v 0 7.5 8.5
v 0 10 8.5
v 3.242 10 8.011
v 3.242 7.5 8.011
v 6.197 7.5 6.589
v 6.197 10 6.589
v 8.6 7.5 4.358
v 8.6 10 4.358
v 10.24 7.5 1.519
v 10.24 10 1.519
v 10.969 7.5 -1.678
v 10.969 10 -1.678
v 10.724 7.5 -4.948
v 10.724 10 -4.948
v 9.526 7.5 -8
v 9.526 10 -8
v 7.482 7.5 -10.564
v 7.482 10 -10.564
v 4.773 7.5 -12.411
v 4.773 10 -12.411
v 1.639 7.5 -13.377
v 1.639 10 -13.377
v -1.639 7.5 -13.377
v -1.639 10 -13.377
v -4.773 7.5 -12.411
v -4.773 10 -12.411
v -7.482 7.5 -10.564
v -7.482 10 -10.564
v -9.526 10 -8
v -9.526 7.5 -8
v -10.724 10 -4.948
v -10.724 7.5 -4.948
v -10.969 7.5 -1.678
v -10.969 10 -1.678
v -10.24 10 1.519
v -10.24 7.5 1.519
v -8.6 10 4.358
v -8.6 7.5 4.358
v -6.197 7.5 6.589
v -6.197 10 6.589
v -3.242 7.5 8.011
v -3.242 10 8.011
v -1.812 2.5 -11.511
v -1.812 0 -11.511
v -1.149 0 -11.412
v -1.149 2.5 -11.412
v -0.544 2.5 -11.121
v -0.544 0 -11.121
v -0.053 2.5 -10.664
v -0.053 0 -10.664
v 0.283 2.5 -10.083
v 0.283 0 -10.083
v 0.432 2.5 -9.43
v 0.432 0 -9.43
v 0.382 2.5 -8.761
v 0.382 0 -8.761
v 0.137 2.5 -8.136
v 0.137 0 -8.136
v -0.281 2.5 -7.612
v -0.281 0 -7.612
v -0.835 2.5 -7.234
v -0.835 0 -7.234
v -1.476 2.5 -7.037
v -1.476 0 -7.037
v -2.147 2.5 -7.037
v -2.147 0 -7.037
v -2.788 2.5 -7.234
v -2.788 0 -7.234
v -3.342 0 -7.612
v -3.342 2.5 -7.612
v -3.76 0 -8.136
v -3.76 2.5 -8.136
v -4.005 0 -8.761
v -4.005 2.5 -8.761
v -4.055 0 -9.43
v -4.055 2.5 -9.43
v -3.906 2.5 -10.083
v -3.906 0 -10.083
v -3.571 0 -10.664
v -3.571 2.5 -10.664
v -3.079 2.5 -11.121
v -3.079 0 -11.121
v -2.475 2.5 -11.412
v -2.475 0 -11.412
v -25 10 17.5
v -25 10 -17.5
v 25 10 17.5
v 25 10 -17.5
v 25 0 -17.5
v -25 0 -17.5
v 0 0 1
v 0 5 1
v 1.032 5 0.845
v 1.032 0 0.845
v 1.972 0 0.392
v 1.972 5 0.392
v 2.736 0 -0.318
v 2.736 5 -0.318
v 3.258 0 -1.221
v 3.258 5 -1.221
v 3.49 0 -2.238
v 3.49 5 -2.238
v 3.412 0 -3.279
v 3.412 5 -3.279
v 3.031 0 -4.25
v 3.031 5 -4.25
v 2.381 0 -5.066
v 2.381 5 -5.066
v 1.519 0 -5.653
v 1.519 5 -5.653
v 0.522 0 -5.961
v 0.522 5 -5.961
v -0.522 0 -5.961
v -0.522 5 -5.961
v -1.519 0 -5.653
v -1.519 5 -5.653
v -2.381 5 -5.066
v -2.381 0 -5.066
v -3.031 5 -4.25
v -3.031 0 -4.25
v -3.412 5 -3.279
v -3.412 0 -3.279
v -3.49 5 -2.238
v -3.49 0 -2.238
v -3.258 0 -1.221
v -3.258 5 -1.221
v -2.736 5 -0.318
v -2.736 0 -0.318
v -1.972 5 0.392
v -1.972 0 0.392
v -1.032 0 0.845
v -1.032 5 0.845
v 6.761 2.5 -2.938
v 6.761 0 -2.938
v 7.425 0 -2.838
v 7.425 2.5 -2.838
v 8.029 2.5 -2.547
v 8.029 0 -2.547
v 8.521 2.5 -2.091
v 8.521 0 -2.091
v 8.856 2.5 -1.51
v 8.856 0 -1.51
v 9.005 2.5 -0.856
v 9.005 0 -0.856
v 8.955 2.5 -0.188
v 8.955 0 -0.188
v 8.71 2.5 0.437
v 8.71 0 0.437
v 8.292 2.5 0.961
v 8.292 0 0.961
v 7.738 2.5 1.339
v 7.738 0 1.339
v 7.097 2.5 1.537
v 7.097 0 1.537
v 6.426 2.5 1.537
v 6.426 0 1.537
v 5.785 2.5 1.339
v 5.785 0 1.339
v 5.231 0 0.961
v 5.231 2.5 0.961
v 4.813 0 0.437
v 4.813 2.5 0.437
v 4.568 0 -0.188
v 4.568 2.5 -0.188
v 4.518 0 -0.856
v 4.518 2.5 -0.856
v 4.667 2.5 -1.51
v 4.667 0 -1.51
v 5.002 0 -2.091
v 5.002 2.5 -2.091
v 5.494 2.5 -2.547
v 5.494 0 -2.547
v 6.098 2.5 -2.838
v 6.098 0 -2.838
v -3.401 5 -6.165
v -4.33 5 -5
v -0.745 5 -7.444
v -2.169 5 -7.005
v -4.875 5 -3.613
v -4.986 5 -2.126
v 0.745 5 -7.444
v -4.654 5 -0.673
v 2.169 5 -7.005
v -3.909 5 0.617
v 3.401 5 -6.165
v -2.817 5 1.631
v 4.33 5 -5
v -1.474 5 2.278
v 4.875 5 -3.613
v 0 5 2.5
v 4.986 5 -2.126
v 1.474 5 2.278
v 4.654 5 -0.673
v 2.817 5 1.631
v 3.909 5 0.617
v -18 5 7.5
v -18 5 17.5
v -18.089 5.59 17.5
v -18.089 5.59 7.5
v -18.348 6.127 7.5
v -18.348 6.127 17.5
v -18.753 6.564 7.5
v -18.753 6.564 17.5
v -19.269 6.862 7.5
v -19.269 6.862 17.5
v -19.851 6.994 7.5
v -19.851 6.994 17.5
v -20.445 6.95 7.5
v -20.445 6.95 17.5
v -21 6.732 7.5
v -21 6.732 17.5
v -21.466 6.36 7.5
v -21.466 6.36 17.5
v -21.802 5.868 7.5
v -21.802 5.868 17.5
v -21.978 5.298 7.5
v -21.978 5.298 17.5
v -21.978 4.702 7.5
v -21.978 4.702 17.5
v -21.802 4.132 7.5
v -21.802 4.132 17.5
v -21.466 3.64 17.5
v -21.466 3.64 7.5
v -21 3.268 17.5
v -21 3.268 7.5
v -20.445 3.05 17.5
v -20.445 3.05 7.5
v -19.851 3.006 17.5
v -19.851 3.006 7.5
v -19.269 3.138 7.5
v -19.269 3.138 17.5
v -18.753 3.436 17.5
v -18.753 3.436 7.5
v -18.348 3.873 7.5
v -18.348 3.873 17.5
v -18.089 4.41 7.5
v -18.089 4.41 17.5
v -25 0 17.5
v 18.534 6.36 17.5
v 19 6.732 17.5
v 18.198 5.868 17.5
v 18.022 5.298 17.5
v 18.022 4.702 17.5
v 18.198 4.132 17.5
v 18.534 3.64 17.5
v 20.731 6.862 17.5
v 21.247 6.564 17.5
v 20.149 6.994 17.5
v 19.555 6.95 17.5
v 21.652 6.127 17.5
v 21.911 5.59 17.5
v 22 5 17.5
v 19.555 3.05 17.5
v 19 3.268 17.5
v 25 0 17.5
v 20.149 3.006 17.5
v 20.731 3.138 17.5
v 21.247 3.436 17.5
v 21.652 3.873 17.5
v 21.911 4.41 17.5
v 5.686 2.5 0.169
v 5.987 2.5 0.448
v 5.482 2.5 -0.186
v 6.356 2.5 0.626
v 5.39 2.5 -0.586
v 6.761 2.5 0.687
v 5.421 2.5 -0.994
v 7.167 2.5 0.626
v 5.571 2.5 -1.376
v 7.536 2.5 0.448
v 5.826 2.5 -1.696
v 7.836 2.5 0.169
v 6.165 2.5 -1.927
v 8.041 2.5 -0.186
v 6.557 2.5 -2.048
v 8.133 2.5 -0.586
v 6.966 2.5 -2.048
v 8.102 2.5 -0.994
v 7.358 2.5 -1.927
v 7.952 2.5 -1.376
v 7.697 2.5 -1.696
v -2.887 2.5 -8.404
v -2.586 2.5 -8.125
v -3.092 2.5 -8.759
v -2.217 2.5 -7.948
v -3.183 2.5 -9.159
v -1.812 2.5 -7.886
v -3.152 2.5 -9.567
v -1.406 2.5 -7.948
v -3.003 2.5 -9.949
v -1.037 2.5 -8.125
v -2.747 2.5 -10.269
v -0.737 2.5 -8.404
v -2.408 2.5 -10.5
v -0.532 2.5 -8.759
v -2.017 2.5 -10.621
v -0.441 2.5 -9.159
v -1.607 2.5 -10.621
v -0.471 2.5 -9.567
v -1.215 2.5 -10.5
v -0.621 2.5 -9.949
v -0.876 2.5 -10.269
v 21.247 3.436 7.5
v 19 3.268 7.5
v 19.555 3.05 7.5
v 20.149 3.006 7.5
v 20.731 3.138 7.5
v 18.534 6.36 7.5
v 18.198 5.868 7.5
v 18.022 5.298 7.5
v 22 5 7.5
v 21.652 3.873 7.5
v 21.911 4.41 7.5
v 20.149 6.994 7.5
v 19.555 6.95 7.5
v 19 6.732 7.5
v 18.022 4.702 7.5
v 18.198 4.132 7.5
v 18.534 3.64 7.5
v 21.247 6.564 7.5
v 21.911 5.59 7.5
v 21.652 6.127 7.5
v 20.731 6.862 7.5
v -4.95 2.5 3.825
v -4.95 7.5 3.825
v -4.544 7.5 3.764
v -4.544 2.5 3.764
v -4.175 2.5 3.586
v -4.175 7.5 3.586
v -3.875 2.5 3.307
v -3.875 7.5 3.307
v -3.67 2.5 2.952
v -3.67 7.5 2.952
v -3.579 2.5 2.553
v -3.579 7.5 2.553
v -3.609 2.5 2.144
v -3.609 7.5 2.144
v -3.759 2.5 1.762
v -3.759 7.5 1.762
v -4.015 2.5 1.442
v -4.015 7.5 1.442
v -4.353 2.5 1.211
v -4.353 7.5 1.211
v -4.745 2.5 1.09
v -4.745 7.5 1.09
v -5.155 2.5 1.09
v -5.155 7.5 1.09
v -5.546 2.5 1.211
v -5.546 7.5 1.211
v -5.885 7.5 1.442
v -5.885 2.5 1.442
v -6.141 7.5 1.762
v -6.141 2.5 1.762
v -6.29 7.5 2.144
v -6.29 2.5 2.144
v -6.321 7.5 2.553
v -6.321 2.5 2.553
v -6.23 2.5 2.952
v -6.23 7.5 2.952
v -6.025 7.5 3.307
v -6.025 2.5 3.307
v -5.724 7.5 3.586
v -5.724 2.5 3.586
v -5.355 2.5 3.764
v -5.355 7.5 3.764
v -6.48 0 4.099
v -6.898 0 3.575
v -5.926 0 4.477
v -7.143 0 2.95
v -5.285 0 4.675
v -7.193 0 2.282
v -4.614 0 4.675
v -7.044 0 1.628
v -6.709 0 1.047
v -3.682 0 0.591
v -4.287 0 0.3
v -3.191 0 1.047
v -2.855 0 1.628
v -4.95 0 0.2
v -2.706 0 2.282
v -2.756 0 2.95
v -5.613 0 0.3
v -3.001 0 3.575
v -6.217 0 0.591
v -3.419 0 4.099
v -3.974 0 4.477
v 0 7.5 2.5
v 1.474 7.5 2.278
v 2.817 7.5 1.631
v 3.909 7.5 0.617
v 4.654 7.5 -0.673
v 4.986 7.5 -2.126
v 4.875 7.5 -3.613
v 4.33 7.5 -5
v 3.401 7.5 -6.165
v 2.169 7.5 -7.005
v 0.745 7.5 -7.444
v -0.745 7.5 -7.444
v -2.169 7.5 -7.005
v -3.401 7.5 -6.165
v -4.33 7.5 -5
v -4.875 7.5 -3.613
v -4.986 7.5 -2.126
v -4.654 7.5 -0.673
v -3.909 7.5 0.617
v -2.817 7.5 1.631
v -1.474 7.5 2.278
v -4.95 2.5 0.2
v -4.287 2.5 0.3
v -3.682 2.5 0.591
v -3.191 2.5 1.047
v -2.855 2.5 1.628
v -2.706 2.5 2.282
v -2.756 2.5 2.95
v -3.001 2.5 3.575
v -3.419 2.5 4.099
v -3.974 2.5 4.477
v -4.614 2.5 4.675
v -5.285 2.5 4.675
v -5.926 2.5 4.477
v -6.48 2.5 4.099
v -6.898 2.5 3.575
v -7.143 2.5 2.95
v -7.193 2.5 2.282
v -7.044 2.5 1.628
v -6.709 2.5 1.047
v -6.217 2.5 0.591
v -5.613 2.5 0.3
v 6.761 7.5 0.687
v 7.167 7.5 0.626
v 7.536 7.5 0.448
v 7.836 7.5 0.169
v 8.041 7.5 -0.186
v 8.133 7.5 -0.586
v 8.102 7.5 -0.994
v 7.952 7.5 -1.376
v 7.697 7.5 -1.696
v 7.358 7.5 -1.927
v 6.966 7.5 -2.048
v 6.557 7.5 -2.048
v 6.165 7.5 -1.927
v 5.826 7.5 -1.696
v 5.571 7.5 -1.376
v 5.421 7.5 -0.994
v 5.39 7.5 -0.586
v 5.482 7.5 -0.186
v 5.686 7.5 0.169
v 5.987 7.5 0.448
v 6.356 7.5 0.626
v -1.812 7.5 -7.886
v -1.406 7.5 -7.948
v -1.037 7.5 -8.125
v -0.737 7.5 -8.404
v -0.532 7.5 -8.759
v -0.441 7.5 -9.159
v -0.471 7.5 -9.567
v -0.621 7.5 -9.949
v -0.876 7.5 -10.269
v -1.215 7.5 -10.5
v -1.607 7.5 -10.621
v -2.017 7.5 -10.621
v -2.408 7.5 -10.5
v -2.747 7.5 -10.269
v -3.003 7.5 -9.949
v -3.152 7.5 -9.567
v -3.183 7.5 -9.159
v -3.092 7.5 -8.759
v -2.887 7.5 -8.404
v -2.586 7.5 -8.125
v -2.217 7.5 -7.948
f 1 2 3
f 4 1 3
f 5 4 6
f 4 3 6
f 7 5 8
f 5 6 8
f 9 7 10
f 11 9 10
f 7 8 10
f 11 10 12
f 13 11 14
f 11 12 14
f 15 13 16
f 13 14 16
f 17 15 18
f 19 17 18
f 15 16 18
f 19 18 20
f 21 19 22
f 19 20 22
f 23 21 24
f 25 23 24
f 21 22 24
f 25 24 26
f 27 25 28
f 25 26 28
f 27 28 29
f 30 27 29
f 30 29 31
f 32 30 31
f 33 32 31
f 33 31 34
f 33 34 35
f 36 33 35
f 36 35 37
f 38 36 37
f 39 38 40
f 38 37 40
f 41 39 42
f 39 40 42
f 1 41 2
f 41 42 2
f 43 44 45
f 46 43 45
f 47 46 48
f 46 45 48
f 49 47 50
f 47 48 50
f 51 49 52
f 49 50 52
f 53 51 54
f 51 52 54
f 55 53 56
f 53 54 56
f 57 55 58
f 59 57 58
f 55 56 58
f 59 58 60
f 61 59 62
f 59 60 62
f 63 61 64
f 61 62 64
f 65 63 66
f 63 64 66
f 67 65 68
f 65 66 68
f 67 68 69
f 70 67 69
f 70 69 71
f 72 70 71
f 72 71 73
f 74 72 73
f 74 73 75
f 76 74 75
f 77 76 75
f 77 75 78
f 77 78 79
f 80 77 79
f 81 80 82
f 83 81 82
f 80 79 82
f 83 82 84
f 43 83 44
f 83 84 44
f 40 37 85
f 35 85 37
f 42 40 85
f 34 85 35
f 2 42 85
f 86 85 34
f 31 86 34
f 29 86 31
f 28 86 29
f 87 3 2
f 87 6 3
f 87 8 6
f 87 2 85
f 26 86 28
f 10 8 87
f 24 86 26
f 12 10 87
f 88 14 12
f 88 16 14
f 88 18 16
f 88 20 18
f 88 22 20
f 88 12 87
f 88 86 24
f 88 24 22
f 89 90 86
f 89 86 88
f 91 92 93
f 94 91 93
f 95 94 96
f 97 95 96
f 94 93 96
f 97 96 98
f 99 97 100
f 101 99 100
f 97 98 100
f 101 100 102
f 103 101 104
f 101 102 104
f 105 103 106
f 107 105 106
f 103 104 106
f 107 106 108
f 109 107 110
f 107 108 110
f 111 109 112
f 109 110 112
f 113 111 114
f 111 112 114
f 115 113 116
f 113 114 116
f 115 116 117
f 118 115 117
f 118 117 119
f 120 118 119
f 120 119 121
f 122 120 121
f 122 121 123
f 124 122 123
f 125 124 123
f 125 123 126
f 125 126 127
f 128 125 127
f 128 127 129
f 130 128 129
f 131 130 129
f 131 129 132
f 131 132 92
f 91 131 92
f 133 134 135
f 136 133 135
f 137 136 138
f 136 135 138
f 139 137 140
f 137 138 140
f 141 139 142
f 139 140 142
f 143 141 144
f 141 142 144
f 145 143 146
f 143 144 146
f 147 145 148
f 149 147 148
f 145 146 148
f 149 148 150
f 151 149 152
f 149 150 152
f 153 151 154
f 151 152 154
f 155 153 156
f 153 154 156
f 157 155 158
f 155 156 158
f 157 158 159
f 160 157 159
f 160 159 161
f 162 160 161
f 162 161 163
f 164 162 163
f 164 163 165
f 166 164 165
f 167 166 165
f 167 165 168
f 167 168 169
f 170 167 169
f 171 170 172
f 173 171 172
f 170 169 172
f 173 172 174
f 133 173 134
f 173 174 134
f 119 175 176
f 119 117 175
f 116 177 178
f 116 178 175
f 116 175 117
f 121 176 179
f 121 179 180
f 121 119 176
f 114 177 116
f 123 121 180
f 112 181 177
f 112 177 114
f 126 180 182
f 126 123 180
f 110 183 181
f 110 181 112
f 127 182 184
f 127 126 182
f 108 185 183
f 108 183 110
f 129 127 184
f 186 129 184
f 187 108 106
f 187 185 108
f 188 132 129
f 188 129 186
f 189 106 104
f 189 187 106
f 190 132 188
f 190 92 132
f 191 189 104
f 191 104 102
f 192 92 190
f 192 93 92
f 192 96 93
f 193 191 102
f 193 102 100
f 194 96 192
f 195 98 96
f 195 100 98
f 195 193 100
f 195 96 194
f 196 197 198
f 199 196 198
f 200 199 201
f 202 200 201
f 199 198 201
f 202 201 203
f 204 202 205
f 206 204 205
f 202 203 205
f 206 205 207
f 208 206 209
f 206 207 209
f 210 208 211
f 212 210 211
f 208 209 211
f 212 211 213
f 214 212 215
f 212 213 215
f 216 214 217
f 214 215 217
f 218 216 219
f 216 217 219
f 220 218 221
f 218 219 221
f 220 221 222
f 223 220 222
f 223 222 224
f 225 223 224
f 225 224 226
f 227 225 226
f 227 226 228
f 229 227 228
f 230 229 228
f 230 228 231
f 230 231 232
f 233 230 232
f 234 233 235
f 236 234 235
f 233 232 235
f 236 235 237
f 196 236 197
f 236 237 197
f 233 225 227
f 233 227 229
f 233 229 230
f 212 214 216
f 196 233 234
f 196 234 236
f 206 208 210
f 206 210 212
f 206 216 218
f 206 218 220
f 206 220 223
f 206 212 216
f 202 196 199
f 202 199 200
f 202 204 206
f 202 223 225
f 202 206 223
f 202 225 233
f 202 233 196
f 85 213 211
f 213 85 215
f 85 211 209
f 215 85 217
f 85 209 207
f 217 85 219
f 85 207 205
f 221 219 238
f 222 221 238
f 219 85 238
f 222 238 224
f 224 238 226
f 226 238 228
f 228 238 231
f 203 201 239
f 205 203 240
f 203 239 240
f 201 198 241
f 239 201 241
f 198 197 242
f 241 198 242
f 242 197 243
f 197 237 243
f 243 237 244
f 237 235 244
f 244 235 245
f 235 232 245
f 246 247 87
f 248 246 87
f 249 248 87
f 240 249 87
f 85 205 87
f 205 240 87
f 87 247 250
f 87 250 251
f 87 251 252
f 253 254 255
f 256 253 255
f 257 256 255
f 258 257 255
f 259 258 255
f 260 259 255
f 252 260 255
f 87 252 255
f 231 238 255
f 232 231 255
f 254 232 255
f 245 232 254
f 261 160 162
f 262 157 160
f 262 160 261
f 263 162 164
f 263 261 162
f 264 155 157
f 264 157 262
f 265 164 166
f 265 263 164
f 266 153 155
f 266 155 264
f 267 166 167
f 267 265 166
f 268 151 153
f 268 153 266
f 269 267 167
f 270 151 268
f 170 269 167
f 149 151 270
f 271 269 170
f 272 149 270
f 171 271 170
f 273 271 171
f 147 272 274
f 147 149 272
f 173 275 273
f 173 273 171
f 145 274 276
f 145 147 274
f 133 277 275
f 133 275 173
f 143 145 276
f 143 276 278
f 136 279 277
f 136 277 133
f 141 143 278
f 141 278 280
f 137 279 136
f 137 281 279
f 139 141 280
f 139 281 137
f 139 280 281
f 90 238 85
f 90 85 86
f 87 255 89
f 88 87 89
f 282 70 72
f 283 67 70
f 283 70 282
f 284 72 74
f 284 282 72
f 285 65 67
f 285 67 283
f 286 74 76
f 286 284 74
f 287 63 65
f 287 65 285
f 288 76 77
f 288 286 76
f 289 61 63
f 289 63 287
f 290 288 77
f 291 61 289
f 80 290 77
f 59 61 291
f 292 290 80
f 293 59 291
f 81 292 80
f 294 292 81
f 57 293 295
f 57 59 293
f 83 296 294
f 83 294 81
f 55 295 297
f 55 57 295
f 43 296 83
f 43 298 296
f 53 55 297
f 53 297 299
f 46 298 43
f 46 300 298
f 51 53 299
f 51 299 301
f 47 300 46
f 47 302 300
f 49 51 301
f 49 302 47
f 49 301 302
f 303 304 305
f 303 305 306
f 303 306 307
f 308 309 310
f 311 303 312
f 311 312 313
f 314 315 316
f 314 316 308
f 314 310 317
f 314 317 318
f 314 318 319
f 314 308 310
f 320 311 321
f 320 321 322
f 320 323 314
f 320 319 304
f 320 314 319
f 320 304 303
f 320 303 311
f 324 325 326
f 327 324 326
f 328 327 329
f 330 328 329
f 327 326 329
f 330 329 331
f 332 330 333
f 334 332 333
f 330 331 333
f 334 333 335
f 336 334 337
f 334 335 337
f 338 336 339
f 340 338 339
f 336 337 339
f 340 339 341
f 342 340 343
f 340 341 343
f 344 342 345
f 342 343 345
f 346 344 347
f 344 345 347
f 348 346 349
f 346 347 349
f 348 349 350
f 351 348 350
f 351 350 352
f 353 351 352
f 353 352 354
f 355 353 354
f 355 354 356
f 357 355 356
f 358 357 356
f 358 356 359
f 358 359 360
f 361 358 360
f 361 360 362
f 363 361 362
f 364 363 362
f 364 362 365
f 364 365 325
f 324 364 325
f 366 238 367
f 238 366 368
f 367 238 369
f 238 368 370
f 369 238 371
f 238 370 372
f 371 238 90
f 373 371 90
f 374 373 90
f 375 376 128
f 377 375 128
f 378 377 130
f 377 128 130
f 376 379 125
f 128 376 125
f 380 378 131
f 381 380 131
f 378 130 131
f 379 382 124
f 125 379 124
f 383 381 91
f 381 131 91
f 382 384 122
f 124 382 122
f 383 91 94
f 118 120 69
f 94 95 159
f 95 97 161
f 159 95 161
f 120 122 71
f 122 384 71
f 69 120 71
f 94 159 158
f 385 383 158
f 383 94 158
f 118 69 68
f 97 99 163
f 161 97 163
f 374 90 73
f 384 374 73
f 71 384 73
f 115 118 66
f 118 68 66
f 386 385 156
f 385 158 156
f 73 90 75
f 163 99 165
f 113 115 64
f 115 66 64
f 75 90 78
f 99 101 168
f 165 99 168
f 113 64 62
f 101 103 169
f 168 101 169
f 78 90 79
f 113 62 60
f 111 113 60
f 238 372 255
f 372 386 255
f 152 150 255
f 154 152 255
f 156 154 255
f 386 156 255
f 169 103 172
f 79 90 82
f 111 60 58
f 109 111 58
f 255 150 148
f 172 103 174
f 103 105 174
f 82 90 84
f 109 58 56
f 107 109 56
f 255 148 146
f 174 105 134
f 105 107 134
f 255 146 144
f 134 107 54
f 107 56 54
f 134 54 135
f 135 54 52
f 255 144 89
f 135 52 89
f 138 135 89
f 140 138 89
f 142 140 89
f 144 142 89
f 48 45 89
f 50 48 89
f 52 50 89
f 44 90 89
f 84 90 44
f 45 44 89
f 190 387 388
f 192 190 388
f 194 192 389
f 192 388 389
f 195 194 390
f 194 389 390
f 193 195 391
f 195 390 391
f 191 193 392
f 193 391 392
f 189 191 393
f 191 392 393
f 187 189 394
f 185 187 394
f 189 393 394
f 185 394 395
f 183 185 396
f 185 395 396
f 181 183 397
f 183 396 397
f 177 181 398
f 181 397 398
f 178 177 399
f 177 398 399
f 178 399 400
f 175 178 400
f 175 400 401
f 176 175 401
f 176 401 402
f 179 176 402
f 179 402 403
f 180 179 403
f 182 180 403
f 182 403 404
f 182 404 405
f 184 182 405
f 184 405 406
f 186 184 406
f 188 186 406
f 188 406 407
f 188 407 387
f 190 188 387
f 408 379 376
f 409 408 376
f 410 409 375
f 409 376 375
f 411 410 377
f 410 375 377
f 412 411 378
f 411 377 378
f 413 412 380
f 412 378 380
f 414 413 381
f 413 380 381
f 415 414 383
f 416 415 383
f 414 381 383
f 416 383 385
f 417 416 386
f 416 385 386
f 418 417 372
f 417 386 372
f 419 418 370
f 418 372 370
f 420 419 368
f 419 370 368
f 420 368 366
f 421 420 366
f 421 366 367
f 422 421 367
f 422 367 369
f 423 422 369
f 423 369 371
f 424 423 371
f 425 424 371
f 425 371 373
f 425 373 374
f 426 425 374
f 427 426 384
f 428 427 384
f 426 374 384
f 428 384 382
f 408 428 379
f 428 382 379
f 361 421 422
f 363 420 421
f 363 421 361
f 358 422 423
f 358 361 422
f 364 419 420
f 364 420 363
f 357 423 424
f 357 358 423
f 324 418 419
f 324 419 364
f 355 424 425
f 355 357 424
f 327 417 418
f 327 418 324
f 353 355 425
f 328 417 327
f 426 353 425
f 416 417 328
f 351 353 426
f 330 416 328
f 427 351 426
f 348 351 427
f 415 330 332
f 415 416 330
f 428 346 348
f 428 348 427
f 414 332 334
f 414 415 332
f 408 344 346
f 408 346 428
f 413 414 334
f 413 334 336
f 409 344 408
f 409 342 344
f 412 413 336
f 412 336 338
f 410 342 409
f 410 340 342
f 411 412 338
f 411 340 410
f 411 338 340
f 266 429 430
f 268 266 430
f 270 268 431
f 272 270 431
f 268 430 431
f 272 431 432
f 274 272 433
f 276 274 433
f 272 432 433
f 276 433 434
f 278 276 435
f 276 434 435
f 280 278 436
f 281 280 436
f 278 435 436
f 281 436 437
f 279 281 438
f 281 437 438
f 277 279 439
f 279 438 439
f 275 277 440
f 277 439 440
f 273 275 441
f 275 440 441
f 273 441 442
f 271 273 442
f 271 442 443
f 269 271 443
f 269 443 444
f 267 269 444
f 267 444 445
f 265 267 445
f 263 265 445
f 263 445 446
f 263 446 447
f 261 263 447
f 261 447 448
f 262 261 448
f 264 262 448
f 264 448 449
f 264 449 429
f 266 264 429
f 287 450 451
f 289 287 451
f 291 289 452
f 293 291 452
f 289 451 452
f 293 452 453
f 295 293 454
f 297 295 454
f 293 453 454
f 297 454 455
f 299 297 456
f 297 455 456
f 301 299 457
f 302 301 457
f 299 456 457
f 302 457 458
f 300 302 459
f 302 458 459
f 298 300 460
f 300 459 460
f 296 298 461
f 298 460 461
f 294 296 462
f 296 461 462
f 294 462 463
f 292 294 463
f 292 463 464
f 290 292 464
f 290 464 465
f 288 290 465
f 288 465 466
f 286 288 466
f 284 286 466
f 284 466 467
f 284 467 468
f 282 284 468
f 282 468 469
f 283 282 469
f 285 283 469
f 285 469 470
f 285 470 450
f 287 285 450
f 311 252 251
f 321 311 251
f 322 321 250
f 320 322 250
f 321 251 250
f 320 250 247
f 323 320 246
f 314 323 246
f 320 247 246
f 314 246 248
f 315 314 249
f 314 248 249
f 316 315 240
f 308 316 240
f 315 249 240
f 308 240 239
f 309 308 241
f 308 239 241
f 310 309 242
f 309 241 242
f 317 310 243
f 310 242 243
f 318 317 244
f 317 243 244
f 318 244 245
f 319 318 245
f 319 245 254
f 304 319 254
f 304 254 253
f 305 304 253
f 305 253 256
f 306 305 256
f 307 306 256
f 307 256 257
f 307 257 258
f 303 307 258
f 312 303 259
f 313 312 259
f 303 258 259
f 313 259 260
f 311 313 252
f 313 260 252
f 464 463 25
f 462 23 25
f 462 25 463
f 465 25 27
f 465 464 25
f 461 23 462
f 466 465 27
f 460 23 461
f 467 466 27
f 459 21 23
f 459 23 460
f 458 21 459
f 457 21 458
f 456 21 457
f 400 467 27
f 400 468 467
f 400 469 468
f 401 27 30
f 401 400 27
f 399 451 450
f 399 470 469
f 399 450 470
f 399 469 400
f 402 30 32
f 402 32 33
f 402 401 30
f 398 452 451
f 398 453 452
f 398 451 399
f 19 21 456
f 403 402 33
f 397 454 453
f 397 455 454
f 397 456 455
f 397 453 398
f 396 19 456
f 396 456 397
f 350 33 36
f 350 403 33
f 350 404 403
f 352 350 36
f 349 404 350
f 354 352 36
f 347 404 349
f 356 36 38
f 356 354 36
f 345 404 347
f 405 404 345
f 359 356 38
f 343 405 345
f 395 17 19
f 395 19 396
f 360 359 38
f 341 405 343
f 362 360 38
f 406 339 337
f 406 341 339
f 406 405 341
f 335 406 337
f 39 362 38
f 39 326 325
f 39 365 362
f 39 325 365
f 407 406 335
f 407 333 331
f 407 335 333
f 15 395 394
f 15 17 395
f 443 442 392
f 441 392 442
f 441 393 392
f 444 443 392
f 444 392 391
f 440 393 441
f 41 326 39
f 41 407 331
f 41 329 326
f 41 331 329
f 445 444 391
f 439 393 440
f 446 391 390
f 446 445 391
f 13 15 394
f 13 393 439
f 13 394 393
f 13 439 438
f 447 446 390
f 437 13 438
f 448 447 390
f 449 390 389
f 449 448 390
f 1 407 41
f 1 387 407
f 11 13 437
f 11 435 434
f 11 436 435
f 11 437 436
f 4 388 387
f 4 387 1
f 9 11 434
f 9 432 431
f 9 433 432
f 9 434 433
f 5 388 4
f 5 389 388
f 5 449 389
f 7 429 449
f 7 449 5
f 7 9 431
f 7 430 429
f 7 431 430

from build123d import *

# Parameters (mm, degrees)
ESQUISSE1_W             = 50
ESQUISSE1_H             = 35
BOSS_EXTRU_1_DEPTH      = 10
ESQUISSE2_R             = 5
ENL_V_MAT_EXTRU_1_DEPTH = 5
ESQUISSE3_R             = 1.375
ESQUISSE3_R_2           = 3.5
ENL_V_MAT_EXTRU_2_DEPTH = 15
ESQUISSE4_R             = 11
ENL_V_MAT_EXTRU_3_DEPTH = 2.5
ESQUISSE5_R             = 2.25
ENL_V_MAT_EXTRU_4_DEPTH = 2.5
ESQUISSE6_R             = 2
ENL_V_MAT_EXTRU_5_DEPTH = 10


with BuildPart() as part:
    # Esquisse1 → Boss.-Extru.1 (new body)
    with BuildSketch(Plane(origin=(0, 0, 0), x_dir=(1, 0, 0), z_dir=(0, 1, 0))):
        Rectangle(ESQUISSE1_W, ESQUISSE1_H)
    extrude(amount=BOSS_EXTRU_1_DEPTH)

    # Esquisse2 → Enlèv. mat.-Extru.1 (cut)
    with BuildSketch(Plane(origin=(0, 10, 0), x_dir=(1, 0, 0), z_dir=(0, 1, 0))):
        with Locations(Location((0, 2.5, 0), (0, 0, 270))):
            Circle(ESQUISSE2_R)
    extrude(amount=-ENL_V_MAT_EXTRU_1_DEPTH, mode=Mode.SUBTRACT)

    # Esquisse3 → Enlèv. mat.-Extru.2 (cut)
    with BuildSketch(Plane(origin=(0, 10, 0), x_dir=(1, 0, 0), z_dir=(0, 1, 0))):
        with Locations(Location((-1.811733316, 9.261480784, 0), (0, 0, 270))):
            Circle(ESQUISSE3_R)
        with Locations(Location((6.761480784, 0.688266684, 0), (0, 0, 270))):
            Circle(ESQUISSE3_R)
        with Locations(Location((-4.949747468, -2.449747468, 0), (0, 0, 270))):
            Circle(ESQUISSE3_R)
        with Locations(Location((0, 2.5, 0), (0, 0, 270))):
            Circle(ESQUISSE3_R_2)
    extrude(amount=-ENL_V_MAT_EXTRU_2_DEPTH, mode=Mode.SUBTRACT)

    # Esquisse4 → Enlèv. mat.-Extru.3 (cut)
    with BuildSketch(Plane(origin=(0, 10, 0), x_dir=(1, 0, 0), z_dir=(0, 1, 0))):
        with Locations(Location((0, 2.5, 0), (0, 0, 270))):
            Circle(ESQUISSE4_R)
    extrude(amount=-ENL_V_MAT_EXTRU_3_DEPTH, mode=Mode.SUBTRACT)

    # Esquisse5 → Enlèv. mat.-Extru.4 (cut)
    with BuildSketch(Plane.XZ):
        with Locations(Location((-4.949747468, 2.449747468, 0), (0, 0, 270))):
            Circle(ESQUISSE5_R)
        with Locations(Location((6.761480784, -0.688266684, 0), (0, 0, 270))):
            Circle(ESQUISSE5_R)
        with Locations(Location((-1.811733316, -9.261480784, 0), (0, 0, 270))):
            Circle(ESQUISSE5_R)
    extrude(amount=-ENL_V_MAT_EXTRU_4_DEPTH, mode=Mode.SUBTRACT)

    # Esquisse6 → Enlèv. mat.-Extru.5 (cut)
    with BuildSketch(Plane.XY.offset(17.5)):
        with Locations((-20, 5)):
            Circle(ESQUISSE6_R)
        with Locations((20, 5)):
            Circle(ESQUISSE6_R)
    extrude(amount=-ENL_V_MAT_EXTRU_5_DEPTH, mode=Mode.SUBTRACT)


solid = part.part
